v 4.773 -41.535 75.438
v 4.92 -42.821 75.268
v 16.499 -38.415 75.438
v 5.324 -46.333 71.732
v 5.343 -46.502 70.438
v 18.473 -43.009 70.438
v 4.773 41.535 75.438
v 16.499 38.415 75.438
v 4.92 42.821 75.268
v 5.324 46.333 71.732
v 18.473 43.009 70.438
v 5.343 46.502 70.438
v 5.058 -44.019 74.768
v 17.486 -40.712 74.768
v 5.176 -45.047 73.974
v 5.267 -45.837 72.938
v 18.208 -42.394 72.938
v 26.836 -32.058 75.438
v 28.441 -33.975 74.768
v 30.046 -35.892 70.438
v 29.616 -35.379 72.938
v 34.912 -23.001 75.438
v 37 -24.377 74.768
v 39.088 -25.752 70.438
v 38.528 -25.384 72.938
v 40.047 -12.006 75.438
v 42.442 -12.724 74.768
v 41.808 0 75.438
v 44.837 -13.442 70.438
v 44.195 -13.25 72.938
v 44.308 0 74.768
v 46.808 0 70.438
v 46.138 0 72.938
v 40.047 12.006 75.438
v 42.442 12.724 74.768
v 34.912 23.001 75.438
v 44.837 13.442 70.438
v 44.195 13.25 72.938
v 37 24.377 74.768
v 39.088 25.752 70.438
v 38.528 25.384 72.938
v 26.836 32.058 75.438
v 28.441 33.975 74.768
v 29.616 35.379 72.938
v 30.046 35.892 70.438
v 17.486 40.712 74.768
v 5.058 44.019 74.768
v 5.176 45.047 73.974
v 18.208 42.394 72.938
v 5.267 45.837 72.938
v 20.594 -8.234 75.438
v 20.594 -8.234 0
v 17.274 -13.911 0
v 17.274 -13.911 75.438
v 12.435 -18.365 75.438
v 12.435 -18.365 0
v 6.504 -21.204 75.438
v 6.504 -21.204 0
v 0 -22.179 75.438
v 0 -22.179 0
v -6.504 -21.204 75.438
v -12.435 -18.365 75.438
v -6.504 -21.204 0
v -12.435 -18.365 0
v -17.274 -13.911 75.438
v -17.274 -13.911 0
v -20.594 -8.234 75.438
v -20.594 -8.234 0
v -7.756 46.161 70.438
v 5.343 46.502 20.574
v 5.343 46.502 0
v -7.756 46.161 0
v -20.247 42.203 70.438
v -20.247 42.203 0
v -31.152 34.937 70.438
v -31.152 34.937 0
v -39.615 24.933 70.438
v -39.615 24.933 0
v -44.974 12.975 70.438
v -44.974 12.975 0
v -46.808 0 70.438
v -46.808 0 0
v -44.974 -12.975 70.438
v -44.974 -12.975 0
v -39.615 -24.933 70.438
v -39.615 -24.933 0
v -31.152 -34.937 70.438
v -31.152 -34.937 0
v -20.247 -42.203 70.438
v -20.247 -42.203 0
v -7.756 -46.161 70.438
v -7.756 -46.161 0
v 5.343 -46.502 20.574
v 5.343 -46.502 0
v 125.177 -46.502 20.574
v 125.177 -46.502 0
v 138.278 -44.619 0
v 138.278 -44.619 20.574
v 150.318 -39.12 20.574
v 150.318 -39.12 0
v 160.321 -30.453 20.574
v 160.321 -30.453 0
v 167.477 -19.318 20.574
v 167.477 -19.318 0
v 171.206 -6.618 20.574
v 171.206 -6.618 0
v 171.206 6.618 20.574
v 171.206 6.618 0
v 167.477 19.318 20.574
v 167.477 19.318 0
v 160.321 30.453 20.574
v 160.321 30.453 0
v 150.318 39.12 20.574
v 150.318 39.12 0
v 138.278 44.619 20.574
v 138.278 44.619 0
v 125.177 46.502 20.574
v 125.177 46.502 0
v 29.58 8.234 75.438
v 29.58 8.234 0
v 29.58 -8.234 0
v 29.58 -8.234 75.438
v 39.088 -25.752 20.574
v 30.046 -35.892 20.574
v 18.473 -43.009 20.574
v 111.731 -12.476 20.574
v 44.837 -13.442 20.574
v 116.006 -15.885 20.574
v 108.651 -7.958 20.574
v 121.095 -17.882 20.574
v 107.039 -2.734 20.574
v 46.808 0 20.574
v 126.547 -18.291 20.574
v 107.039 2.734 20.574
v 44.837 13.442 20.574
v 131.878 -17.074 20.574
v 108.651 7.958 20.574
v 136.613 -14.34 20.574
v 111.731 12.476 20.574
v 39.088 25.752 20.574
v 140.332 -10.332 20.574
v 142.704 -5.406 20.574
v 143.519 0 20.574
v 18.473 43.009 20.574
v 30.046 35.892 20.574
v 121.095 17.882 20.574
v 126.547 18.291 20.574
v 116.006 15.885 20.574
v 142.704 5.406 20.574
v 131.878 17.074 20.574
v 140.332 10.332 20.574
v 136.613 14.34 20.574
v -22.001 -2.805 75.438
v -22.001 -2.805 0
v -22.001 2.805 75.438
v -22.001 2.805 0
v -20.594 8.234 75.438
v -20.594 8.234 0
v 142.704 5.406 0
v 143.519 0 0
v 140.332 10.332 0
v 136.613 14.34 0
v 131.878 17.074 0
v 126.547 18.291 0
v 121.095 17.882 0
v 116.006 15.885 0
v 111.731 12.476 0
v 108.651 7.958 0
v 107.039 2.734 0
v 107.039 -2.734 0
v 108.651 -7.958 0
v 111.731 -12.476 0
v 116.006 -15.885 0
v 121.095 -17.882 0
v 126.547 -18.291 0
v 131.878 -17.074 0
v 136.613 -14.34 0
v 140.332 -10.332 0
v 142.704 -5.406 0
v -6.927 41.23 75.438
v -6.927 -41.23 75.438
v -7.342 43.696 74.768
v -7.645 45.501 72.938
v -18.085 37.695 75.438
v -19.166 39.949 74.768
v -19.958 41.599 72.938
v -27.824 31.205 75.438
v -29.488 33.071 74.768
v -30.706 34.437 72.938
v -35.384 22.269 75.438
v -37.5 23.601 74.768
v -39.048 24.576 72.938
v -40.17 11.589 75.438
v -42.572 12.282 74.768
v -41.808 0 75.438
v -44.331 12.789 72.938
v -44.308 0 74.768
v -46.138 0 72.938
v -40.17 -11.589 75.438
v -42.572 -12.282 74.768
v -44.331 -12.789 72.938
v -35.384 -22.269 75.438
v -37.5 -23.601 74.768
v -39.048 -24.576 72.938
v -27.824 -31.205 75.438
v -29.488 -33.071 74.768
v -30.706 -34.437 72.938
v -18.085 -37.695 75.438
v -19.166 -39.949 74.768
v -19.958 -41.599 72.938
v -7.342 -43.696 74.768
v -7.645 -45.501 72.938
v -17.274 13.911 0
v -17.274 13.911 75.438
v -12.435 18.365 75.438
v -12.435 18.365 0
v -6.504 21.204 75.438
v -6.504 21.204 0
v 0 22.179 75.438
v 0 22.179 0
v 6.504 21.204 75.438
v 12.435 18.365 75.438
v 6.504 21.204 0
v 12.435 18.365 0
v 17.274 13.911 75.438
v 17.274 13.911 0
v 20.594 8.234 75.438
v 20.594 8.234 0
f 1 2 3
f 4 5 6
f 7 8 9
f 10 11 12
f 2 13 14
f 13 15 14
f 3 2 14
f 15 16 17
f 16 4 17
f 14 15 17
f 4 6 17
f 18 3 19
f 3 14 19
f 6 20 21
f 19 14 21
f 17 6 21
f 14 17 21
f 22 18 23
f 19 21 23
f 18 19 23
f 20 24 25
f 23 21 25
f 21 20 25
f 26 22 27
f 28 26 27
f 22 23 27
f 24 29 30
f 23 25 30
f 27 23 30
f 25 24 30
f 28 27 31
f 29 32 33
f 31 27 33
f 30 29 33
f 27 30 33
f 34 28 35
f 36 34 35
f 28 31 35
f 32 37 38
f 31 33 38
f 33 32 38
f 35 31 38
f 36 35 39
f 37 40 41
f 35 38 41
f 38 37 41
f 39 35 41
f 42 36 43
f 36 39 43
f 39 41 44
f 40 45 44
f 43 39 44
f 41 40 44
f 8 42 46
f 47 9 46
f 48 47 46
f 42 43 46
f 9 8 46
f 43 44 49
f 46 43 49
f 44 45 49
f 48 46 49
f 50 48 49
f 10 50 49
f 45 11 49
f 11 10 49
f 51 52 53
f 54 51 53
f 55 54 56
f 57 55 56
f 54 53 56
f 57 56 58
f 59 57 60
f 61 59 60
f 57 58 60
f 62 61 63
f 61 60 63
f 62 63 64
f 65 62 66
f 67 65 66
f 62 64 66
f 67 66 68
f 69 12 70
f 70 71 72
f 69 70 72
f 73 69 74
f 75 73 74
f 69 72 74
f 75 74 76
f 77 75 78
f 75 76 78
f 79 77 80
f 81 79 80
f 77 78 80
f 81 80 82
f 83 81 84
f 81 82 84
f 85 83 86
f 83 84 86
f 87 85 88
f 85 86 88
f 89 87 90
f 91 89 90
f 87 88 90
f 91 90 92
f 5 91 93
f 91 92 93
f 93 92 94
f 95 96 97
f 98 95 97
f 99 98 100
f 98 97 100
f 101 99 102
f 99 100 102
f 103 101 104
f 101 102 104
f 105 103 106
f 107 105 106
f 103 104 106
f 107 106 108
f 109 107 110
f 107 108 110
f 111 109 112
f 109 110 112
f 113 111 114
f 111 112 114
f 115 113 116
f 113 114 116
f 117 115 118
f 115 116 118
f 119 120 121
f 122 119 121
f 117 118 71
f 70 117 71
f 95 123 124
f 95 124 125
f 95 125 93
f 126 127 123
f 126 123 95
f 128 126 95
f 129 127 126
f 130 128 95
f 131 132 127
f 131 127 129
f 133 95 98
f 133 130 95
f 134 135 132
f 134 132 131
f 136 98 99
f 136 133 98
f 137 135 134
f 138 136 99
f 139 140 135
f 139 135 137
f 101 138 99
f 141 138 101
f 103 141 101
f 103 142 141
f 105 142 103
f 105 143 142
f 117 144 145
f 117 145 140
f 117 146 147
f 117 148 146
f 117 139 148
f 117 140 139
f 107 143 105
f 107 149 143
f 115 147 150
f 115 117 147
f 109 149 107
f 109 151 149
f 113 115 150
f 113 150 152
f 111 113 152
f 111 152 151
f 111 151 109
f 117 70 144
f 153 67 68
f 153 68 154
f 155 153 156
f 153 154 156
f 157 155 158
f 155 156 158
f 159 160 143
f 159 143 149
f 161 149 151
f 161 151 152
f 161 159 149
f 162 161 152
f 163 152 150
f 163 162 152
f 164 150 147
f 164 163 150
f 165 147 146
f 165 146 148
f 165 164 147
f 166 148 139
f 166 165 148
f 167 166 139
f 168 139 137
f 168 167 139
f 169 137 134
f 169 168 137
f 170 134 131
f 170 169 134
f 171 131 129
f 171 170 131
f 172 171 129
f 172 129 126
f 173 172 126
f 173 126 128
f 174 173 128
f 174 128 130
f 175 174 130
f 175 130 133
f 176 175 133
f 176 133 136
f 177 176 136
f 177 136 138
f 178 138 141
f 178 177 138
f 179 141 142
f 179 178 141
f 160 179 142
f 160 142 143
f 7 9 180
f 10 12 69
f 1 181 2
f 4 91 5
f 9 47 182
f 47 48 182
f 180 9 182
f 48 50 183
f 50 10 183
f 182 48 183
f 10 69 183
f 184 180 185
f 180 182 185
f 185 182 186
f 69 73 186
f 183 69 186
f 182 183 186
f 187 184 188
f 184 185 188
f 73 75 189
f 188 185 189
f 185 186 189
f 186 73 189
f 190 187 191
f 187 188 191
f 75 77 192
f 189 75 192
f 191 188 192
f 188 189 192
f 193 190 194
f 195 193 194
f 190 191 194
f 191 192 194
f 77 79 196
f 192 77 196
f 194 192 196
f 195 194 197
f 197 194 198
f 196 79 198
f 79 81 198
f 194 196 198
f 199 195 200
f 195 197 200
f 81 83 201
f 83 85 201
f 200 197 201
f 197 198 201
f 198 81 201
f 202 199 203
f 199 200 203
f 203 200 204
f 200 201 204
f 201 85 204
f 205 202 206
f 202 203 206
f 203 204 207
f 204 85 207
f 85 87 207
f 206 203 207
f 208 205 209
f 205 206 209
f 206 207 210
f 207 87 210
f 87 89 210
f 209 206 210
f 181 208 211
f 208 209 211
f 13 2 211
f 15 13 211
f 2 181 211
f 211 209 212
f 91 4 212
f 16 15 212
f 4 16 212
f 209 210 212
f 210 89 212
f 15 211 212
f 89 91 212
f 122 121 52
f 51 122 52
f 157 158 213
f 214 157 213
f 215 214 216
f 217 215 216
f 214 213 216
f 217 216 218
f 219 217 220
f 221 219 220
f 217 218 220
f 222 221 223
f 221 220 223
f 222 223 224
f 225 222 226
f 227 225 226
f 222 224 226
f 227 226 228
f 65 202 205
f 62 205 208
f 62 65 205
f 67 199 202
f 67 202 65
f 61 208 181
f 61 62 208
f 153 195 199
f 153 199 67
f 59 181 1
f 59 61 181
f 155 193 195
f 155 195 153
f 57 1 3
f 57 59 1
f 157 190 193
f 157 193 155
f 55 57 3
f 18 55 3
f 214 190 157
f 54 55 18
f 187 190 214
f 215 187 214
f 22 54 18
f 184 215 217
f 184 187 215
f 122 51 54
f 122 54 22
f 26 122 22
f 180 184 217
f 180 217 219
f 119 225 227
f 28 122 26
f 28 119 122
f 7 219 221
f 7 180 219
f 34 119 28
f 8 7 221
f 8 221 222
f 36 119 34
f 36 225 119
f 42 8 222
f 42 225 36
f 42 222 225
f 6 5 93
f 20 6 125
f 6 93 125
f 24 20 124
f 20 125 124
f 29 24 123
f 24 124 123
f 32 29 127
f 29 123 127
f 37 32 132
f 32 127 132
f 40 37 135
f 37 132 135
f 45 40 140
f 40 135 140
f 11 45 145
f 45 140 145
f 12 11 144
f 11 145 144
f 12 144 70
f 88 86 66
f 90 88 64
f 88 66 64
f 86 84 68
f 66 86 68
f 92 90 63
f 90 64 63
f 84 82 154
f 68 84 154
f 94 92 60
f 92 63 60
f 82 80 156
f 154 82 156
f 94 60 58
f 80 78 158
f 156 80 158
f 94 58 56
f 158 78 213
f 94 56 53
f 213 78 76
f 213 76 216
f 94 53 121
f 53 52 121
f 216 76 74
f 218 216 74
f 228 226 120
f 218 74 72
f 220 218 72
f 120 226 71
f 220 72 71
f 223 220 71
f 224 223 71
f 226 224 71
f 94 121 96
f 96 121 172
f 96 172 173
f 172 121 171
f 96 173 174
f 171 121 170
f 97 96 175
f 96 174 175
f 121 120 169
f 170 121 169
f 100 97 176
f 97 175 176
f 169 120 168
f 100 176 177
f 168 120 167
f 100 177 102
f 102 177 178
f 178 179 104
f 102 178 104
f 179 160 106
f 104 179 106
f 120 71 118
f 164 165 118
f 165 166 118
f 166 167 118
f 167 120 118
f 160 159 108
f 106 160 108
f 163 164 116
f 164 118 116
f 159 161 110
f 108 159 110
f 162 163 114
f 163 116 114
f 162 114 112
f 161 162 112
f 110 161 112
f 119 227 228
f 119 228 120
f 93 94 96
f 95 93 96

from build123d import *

# Parameters (mm, degrees)
F0_R     = 41.7429221606
F1_DEPTH = 75.438
F0_R_2   = 18.342139753
F2_DEPTH = 20.574
F3_DEPTH = 73
F4_R     = 5


with BuildPart() as f1:
    # F0 (on Top) → F1 (new body)
    with BuildSketch(Plane.XY):
        with BuildLine():
            ThreePointArc((5.3434108118, -46.5023219585), (34.9366141904, -31.1520621396), (46.8083110851, 0))
            ThreePointArc((46.8083110851, 0), (34.9366141904, 31.1520621396), (5.3434108118, 46.5023219585))
            ThreePointArc((5.3434108118, 46.5023219585), (-46.8083110851, 0), (5.3434108118, -46.5023219585))
        make_face()
        Circle(F0_R, mode=Mode.SUBTRACT)
        Circle(F0_R)
        with BuildLine():
            ThreePointArc((-20.5937367847, -8.2344636321), (-22.1790077791, 0), (-20.5937367847, 8.2344636321))
            ThreePointArc((-20.5937367847, 8.2344636321), (0, 22.1790077791), (20.5937367847, 8.2344636321))
            Line((20.5937367847, 8.2344636321), (29.5797027647, 8.2344636321))
            Line((29.5797027647, 8.2344636321), (29.5797027647, -8.2344636321))
            Line((29.5797027647, -8.2344636321), (20.5937367847, -8.2344636321))
            ThreePointArc((20.5937367847, -8.2344636321), (0, -22.1790077791), (-20.5937367847, -8.2344636321))
        make_face(mode=Mode.SUBTRACT)
    extrude(amount=F1_DEPTH)

    # F0 (on Top) → F2 (join)
    with BuildSketch(Plane.XY):
        with BuildLine():
            ThreePointArc((5.3434108118, 46.5023219585), (34.9366141904, 31.1520621396), (46.8083110851, 0))
            ThreePointArc((46.8083110851, 0), (34.9366141904, -31.1520621396), (5.3434108118, -46.5023219585))
            Line((5.3434108118, -46.5023219585), (125.1767128706, -46.5023219585))
            ThreePointArc((125.1767128706, -46.5023219585), (171.6790348291, 0), (125.1767128706, 46.5023219585))
            Line((125.1767128706, 46.5023219585), (5.3434108118, 46.5023219585))
        make_face()
        with Locations((125.1767128706, 0)):
            Circle(F0_R_2, mode=Mode.SUBTRACT)
    extrude(amount=F2_DEPTH)

    # F0 (on Top) → F3 (join)
    with BuildSketch(Plane.XY):
        with BuildLine():
            ThreePointArc((5.3434108118, -46.5023219585), (34.9366141904, -31.1520621396), (46.8083110851, 0))
            ThreePointArc((46.8083110851, 0), (34.9366141904, 31.1520621396), (5.3434108118, 46.5023219585))
            ThreePointArc((5.3434108118, 46.5023219585), (-46.8083110851, 0), (5.3434108118, -46.5023219585))
        make_face()
        Circle(F0_R, mode=Mode.SUBTRACT)
    extrude(amount=F3_DEPTH)

    # F4
    f4_edges = [f1.edges().sort_by_distance(p)[0] for p in [
        (-5.343411, 46.502322, 75.438),
    ]]
    fillet(f4_edges, radius=F4_R)


solid = f1.part
